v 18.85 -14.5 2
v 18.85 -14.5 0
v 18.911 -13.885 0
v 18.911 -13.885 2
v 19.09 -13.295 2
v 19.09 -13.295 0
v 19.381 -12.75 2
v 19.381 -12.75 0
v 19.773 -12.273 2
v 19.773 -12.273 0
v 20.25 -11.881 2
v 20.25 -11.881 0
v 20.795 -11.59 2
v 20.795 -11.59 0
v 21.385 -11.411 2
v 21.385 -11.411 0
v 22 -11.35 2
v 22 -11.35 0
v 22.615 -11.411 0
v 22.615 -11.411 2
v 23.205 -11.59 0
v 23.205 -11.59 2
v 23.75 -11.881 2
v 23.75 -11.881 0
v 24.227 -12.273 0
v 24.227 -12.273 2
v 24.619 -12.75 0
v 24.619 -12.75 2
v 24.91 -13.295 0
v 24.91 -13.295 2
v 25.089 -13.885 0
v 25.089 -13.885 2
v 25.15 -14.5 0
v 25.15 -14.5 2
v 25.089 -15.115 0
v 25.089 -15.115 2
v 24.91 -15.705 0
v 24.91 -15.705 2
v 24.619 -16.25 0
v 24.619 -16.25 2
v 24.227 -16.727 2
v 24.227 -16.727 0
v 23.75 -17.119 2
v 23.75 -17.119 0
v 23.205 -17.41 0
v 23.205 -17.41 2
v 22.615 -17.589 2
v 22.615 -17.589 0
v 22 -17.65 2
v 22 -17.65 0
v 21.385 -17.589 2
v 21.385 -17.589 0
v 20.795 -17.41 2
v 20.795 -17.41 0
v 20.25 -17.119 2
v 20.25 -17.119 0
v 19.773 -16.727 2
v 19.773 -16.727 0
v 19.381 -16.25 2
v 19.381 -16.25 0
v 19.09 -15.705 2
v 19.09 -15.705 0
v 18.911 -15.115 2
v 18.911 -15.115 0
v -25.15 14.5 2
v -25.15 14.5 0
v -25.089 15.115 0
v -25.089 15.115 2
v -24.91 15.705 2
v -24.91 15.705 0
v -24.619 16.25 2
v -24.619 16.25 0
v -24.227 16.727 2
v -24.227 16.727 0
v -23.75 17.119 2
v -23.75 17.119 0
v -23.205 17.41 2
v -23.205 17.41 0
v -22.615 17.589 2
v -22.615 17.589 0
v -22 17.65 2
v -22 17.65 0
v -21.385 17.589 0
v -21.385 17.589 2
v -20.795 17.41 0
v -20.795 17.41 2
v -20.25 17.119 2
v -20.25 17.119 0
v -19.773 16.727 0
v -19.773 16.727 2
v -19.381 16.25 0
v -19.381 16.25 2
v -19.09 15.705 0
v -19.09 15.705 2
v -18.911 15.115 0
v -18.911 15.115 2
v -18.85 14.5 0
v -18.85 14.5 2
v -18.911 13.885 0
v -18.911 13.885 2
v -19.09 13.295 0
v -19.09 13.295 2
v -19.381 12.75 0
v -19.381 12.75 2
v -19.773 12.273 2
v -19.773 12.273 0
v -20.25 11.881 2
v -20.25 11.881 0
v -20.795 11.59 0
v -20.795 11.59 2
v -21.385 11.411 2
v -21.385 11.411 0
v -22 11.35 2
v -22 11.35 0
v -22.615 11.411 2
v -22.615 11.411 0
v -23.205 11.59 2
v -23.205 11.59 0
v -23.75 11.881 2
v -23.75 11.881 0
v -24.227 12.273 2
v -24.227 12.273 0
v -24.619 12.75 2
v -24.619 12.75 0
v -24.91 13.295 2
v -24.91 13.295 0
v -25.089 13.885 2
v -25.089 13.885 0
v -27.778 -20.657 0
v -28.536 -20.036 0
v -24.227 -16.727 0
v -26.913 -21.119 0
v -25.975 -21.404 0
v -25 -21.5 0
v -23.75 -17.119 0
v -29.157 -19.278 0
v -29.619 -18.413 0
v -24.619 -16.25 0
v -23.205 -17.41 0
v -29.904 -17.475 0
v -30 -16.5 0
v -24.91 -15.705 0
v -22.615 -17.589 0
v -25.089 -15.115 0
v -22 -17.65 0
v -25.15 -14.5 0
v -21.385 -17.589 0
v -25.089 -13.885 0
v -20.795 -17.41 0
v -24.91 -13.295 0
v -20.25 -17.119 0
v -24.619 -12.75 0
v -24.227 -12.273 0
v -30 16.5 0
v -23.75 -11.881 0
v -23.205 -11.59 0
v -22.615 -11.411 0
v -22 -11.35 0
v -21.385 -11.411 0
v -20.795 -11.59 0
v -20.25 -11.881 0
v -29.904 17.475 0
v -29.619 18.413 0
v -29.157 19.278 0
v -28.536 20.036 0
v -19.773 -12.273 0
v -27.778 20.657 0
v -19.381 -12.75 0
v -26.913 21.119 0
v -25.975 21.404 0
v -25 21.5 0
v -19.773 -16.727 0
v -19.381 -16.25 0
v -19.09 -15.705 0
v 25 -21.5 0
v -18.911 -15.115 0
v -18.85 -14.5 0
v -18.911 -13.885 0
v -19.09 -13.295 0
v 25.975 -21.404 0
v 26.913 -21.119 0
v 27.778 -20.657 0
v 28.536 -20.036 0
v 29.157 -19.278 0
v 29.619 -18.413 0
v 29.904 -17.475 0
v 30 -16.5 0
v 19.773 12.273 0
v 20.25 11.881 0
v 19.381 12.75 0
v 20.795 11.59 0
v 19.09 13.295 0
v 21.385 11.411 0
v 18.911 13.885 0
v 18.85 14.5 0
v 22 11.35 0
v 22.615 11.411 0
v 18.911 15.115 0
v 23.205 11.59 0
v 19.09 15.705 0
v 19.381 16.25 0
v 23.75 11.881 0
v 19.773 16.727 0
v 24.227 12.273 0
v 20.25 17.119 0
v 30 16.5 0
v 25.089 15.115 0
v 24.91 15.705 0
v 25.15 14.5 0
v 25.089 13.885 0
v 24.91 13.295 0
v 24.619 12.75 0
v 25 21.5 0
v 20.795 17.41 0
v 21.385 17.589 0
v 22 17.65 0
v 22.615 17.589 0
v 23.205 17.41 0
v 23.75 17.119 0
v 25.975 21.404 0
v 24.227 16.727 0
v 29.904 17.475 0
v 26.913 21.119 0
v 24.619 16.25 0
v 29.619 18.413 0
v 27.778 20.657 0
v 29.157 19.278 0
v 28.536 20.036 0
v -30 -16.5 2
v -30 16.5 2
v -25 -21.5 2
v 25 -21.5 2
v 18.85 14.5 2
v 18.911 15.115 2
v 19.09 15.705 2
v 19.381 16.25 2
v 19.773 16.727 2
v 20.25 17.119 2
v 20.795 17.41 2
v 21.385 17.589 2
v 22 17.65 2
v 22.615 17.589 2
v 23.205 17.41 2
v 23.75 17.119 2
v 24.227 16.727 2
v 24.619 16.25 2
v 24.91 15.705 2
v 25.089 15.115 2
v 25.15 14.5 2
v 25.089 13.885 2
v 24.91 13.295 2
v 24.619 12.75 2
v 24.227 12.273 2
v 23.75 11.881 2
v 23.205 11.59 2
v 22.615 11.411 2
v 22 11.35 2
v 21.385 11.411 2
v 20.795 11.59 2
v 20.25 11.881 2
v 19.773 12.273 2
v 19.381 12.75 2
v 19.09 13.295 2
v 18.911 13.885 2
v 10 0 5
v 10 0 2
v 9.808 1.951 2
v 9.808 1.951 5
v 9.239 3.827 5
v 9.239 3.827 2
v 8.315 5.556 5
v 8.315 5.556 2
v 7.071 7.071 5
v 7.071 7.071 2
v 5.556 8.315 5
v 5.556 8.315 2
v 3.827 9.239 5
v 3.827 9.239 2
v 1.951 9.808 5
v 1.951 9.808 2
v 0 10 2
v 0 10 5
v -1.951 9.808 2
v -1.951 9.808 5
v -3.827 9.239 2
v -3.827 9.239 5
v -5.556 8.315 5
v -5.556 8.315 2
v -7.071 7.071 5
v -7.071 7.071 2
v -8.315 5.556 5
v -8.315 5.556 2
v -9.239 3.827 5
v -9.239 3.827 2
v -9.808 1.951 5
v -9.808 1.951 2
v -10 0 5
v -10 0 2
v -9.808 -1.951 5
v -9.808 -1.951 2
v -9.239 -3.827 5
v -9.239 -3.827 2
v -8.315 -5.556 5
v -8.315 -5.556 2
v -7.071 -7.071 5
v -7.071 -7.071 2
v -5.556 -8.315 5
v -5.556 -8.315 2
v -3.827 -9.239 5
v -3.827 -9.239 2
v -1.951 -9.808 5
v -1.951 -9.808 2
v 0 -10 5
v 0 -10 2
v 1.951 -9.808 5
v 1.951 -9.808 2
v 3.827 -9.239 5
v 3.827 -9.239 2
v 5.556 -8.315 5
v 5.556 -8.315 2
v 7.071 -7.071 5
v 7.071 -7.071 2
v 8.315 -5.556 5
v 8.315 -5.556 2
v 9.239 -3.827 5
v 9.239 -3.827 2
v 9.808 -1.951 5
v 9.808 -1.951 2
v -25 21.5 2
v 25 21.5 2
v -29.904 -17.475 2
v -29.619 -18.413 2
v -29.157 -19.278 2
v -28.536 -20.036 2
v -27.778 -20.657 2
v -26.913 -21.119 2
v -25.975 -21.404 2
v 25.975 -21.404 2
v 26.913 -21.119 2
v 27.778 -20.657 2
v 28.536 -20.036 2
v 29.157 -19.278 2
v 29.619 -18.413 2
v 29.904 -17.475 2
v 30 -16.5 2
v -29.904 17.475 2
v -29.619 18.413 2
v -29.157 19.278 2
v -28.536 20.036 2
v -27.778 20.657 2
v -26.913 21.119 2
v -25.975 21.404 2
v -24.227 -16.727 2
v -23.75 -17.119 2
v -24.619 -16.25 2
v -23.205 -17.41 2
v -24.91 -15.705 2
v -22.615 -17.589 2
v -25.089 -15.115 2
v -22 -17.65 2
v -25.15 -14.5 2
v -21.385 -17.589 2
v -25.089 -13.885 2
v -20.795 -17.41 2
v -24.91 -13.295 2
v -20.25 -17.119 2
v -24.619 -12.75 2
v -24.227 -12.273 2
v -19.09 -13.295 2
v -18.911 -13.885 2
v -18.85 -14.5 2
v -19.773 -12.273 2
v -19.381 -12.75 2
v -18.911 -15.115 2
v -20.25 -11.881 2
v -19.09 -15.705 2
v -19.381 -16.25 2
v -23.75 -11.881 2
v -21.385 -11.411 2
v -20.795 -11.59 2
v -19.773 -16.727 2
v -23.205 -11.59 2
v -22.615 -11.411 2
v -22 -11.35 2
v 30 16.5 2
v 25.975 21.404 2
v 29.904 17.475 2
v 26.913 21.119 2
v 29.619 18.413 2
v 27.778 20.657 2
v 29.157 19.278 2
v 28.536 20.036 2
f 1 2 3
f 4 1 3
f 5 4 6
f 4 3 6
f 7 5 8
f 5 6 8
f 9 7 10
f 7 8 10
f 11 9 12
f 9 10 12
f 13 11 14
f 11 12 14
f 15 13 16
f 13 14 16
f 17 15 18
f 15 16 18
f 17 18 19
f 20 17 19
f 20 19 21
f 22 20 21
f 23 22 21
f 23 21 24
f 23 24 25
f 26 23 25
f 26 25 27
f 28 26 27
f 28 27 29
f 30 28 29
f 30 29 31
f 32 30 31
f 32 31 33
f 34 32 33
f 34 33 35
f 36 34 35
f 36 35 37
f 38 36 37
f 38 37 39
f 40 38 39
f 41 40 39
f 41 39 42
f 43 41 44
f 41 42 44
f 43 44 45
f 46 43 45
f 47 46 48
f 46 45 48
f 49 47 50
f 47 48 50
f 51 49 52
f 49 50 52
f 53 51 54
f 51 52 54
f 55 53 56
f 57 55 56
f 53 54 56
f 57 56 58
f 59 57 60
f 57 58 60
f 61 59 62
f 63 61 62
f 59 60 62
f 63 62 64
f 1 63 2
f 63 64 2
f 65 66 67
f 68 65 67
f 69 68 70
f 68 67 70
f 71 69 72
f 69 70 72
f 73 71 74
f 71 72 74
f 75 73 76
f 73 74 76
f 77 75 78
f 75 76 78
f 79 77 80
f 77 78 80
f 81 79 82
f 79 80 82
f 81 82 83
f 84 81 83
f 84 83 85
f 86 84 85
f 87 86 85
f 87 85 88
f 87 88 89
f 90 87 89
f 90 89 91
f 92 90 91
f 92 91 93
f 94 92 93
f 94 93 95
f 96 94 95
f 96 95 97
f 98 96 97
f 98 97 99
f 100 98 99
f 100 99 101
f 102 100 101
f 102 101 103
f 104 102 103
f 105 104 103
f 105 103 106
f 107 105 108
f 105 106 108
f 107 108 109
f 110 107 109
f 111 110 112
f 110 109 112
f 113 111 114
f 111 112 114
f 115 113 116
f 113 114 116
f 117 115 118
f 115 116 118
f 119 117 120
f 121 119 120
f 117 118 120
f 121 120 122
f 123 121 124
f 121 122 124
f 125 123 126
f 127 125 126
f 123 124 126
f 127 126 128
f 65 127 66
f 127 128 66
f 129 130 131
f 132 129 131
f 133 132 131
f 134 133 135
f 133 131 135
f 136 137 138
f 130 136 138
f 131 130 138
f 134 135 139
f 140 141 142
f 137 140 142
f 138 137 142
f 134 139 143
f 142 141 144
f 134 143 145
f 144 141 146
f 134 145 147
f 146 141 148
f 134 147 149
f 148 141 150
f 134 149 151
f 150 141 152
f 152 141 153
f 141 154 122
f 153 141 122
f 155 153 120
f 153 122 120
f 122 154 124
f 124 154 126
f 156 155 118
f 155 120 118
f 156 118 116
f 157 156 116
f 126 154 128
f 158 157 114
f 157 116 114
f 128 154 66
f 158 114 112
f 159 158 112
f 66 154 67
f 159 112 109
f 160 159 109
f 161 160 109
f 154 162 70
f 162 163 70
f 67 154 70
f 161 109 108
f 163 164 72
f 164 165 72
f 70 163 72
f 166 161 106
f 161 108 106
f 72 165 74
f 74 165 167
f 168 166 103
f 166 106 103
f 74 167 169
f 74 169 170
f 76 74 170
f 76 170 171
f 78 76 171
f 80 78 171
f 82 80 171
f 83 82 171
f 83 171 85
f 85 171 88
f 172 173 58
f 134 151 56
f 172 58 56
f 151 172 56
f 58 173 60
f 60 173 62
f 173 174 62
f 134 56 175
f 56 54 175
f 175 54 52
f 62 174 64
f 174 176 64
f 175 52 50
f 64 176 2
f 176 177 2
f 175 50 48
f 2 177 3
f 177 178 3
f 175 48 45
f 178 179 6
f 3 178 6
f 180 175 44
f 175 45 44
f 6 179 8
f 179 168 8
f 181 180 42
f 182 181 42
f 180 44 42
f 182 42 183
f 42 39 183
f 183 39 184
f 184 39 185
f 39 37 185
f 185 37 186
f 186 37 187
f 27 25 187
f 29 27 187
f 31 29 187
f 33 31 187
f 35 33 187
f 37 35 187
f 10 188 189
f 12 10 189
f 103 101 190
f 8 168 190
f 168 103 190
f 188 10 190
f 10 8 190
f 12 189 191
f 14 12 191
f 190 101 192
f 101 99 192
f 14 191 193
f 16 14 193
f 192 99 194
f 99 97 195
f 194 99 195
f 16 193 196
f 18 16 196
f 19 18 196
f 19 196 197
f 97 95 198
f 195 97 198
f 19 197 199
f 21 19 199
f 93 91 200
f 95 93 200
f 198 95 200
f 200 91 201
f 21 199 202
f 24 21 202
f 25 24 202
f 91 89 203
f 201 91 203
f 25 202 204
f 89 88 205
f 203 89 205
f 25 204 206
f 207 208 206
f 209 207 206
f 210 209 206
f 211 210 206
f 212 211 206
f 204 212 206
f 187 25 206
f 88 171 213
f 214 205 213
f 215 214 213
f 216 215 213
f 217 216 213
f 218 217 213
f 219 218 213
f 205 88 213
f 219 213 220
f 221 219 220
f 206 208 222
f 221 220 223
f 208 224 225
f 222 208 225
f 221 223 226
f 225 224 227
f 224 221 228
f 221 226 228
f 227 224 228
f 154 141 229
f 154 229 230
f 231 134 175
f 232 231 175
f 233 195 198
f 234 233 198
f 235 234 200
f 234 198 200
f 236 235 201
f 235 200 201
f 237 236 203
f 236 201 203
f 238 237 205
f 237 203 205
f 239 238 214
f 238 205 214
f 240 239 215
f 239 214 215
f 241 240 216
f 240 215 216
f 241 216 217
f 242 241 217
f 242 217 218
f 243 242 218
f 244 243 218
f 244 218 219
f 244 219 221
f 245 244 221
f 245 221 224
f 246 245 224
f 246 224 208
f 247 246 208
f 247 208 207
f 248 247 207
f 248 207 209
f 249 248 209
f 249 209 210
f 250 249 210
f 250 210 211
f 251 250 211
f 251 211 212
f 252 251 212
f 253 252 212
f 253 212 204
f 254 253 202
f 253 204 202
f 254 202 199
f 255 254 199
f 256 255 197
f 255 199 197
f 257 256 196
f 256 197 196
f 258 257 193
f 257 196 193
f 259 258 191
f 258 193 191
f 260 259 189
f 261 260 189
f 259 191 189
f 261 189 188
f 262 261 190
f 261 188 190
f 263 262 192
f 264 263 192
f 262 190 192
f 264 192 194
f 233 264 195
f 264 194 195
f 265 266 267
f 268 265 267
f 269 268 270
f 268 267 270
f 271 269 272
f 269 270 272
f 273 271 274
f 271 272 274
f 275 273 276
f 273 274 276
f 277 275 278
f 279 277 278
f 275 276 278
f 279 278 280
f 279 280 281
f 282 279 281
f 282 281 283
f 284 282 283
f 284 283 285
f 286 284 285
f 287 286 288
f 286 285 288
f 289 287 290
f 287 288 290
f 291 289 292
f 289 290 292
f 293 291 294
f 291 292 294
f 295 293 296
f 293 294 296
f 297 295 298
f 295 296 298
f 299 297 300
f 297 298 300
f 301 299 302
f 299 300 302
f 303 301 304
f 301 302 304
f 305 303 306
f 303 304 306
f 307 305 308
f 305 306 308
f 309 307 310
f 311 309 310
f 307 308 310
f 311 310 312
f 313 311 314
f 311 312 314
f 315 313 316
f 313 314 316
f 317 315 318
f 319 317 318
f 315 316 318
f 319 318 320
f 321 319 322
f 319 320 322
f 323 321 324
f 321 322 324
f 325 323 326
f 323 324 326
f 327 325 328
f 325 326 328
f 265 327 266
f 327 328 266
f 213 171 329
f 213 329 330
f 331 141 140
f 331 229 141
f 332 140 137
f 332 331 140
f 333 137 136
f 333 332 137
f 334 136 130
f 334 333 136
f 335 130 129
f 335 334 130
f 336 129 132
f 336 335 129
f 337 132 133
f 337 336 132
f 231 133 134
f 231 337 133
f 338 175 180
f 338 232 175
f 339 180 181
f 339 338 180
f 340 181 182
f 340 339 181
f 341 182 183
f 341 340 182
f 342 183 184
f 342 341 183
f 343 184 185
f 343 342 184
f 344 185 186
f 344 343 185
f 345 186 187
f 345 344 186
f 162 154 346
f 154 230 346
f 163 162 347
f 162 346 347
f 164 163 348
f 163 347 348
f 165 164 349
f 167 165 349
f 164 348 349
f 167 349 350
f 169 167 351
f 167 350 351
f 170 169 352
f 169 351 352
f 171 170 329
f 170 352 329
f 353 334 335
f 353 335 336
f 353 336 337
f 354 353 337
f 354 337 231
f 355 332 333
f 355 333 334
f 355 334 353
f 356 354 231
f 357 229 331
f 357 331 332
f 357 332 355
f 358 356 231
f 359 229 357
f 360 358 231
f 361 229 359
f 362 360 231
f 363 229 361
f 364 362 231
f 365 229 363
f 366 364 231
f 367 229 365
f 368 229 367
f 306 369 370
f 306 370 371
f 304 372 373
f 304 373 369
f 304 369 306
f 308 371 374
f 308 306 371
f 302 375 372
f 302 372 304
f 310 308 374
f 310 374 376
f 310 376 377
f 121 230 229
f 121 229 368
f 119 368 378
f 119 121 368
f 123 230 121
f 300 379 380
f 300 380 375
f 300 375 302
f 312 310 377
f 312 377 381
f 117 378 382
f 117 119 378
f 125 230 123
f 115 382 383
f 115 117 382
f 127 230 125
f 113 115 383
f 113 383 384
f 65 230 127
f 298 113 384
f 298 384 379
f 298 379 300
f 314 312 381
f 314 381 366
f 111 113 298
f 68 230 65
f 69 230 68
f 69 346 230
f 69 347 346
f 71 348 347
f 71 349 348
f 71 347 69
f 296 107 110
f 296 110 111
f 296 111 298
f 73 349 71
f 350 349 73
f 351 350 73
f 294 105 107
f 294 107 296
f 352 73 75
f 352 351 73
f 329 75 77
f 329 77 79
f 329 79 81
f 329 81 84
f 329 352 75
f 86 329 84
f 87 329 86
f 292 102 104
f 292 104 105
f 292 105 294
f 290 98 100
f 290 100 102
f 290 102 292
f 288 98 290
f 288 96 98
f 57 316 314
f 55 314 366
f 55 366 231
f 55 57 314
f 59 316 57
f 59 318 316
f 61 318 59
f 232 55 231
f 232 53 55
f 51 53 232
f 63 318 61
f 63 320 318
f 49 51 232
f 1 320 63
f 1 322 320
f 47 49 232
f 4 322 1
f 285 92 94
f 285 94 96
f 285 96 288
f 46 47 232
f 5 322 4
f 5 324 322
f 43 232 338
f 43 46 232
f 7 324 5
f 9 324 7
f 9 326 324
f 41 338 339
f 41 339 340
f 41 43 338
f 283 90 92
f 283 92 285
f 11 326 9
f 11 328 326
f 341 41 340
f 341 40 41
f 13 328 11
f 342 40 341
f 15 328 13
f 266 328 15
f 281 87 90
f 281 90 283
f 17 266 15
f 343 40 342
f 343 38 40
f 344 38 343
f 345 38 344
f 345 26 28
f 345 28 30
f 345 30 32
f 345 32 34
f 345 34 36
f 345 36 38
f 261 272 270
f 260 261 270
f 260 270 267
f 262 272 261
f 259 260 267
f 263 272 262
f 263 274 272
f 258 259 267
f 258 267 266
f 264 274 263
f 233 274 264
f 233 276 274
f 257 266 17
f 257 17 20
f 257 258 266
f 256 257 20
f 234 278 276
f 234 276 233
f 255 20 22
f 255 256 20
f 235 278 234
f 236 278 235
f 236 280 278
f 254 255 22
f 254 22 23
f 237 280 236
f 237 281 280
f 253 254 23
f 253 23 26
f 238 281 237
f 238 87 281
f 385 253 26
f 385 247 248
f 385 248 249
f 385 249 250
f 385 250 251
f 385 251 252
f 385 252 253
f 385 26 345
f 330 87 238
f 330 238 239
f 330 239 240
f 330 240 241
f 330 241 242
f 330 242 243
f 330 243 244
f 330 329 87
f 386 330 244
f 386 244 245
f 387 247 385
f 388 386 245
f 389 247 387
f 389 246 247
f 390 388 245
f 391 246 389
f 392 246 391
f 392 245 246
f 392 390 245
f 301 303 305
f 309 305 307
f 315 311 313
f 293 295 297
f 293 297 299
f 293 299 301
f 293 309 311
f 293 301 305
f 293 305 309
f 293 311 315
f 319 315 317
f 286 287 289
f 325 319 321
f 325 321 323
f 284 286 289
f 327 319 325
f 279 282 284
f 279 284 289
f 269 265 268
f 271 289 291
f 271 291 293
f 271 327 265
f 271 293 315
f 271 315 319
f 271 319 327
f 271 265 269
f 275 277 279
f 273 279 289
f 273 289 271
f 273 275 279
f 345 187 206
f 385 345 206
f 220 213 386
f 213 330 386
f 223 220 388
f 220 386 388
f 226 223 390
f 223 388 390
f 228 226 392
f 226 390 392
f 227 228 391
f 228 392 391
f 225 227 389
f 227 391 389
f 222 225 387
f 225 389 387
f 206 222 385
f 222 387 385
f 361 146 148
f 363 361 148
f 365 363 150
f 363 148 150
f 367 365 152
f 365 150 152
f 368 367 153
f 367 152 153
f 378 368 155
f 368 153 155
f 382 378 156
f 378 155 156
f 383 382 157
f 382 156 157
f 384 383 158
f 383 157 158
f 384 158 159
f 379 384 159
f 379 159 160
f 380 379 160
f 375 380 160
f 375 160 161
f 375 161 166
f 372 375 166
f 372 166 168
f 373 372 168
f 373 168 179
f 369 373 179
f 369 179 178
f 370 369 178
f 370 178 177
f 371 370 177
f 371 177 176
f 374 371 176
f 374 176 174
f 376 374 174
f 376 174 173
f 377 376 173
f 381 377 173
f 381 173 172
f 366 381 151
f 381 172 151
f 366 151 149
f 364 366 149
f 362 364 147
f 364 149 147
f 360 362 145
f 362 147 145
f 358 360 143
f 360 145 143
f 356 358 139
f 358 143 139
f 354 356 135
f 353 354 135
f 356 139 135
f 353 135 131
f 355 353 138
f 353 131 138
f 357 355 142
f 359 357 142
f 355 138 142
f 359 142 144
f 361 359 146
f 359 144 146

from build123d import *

# Parameters (mm, degrees)
SKETCH_1_W          = 60
SKETCH_1_H          = 43
EXTRUDE_1_DEPTH     = 2
SKETCH_2_R          = 10
EXTRUDE_2_DEPTH     = 3
FILLET_1_R          = 5
SKETCH_3_R          = 3.15
CUT_EXTRUDE_1_DEPTH = 3


with BuildPart() as part:
    # 草图1 → 凸台-拉伸1 (new body)
    with BuildSketch(Plane.XY):
        Rectangle(SKETCH_1_W, SKETCH_1_H)
    extrude(amount=EXTRUDE_1_DEPTH)

    # 草图2 → 凸台-拉伸2 (add)
    with BuildSketch(Plane.XY.offset(2)):
        Circle(SKETCH_2_R)
    extrude(amount=EXTRUDE_2_DEPTH)

    # 圆角1
    fillet_1_edges = [part.edges().sort_by_distance(p)[0] for p in [
        (-30, 21.5, 1),
        (30, 21.5, 1),
        (30, -21.5, 1),
        (-30, -21.5, 1),
    ]]
    fillet(fillet_1_edges, radius=FILLET_1_R)

    # 草图3 → 切除-拉伸1 (cut)
    with BuildSketch(Plane(origin=(0, 0, 0), x_dir=(-1, 0, 0), z_dir=(0, 0, -1))):
        with Locations((22, 14.5)):
            Circle(SKETCH_3_R)
        with Locations((22, -14.5)):
            Circle(SKETCH_3_R)
        with Locations((-22, 14.5)):
            Circle(SKETCH_3_R)
        with Locations((-22, -14.5)):
            Circle(SKETCH_3_R)
    extrude(amount=-CUT_EXTRUDE_1_DEPTH, mode=Mode.SUBTRACT)


solid = part.part
